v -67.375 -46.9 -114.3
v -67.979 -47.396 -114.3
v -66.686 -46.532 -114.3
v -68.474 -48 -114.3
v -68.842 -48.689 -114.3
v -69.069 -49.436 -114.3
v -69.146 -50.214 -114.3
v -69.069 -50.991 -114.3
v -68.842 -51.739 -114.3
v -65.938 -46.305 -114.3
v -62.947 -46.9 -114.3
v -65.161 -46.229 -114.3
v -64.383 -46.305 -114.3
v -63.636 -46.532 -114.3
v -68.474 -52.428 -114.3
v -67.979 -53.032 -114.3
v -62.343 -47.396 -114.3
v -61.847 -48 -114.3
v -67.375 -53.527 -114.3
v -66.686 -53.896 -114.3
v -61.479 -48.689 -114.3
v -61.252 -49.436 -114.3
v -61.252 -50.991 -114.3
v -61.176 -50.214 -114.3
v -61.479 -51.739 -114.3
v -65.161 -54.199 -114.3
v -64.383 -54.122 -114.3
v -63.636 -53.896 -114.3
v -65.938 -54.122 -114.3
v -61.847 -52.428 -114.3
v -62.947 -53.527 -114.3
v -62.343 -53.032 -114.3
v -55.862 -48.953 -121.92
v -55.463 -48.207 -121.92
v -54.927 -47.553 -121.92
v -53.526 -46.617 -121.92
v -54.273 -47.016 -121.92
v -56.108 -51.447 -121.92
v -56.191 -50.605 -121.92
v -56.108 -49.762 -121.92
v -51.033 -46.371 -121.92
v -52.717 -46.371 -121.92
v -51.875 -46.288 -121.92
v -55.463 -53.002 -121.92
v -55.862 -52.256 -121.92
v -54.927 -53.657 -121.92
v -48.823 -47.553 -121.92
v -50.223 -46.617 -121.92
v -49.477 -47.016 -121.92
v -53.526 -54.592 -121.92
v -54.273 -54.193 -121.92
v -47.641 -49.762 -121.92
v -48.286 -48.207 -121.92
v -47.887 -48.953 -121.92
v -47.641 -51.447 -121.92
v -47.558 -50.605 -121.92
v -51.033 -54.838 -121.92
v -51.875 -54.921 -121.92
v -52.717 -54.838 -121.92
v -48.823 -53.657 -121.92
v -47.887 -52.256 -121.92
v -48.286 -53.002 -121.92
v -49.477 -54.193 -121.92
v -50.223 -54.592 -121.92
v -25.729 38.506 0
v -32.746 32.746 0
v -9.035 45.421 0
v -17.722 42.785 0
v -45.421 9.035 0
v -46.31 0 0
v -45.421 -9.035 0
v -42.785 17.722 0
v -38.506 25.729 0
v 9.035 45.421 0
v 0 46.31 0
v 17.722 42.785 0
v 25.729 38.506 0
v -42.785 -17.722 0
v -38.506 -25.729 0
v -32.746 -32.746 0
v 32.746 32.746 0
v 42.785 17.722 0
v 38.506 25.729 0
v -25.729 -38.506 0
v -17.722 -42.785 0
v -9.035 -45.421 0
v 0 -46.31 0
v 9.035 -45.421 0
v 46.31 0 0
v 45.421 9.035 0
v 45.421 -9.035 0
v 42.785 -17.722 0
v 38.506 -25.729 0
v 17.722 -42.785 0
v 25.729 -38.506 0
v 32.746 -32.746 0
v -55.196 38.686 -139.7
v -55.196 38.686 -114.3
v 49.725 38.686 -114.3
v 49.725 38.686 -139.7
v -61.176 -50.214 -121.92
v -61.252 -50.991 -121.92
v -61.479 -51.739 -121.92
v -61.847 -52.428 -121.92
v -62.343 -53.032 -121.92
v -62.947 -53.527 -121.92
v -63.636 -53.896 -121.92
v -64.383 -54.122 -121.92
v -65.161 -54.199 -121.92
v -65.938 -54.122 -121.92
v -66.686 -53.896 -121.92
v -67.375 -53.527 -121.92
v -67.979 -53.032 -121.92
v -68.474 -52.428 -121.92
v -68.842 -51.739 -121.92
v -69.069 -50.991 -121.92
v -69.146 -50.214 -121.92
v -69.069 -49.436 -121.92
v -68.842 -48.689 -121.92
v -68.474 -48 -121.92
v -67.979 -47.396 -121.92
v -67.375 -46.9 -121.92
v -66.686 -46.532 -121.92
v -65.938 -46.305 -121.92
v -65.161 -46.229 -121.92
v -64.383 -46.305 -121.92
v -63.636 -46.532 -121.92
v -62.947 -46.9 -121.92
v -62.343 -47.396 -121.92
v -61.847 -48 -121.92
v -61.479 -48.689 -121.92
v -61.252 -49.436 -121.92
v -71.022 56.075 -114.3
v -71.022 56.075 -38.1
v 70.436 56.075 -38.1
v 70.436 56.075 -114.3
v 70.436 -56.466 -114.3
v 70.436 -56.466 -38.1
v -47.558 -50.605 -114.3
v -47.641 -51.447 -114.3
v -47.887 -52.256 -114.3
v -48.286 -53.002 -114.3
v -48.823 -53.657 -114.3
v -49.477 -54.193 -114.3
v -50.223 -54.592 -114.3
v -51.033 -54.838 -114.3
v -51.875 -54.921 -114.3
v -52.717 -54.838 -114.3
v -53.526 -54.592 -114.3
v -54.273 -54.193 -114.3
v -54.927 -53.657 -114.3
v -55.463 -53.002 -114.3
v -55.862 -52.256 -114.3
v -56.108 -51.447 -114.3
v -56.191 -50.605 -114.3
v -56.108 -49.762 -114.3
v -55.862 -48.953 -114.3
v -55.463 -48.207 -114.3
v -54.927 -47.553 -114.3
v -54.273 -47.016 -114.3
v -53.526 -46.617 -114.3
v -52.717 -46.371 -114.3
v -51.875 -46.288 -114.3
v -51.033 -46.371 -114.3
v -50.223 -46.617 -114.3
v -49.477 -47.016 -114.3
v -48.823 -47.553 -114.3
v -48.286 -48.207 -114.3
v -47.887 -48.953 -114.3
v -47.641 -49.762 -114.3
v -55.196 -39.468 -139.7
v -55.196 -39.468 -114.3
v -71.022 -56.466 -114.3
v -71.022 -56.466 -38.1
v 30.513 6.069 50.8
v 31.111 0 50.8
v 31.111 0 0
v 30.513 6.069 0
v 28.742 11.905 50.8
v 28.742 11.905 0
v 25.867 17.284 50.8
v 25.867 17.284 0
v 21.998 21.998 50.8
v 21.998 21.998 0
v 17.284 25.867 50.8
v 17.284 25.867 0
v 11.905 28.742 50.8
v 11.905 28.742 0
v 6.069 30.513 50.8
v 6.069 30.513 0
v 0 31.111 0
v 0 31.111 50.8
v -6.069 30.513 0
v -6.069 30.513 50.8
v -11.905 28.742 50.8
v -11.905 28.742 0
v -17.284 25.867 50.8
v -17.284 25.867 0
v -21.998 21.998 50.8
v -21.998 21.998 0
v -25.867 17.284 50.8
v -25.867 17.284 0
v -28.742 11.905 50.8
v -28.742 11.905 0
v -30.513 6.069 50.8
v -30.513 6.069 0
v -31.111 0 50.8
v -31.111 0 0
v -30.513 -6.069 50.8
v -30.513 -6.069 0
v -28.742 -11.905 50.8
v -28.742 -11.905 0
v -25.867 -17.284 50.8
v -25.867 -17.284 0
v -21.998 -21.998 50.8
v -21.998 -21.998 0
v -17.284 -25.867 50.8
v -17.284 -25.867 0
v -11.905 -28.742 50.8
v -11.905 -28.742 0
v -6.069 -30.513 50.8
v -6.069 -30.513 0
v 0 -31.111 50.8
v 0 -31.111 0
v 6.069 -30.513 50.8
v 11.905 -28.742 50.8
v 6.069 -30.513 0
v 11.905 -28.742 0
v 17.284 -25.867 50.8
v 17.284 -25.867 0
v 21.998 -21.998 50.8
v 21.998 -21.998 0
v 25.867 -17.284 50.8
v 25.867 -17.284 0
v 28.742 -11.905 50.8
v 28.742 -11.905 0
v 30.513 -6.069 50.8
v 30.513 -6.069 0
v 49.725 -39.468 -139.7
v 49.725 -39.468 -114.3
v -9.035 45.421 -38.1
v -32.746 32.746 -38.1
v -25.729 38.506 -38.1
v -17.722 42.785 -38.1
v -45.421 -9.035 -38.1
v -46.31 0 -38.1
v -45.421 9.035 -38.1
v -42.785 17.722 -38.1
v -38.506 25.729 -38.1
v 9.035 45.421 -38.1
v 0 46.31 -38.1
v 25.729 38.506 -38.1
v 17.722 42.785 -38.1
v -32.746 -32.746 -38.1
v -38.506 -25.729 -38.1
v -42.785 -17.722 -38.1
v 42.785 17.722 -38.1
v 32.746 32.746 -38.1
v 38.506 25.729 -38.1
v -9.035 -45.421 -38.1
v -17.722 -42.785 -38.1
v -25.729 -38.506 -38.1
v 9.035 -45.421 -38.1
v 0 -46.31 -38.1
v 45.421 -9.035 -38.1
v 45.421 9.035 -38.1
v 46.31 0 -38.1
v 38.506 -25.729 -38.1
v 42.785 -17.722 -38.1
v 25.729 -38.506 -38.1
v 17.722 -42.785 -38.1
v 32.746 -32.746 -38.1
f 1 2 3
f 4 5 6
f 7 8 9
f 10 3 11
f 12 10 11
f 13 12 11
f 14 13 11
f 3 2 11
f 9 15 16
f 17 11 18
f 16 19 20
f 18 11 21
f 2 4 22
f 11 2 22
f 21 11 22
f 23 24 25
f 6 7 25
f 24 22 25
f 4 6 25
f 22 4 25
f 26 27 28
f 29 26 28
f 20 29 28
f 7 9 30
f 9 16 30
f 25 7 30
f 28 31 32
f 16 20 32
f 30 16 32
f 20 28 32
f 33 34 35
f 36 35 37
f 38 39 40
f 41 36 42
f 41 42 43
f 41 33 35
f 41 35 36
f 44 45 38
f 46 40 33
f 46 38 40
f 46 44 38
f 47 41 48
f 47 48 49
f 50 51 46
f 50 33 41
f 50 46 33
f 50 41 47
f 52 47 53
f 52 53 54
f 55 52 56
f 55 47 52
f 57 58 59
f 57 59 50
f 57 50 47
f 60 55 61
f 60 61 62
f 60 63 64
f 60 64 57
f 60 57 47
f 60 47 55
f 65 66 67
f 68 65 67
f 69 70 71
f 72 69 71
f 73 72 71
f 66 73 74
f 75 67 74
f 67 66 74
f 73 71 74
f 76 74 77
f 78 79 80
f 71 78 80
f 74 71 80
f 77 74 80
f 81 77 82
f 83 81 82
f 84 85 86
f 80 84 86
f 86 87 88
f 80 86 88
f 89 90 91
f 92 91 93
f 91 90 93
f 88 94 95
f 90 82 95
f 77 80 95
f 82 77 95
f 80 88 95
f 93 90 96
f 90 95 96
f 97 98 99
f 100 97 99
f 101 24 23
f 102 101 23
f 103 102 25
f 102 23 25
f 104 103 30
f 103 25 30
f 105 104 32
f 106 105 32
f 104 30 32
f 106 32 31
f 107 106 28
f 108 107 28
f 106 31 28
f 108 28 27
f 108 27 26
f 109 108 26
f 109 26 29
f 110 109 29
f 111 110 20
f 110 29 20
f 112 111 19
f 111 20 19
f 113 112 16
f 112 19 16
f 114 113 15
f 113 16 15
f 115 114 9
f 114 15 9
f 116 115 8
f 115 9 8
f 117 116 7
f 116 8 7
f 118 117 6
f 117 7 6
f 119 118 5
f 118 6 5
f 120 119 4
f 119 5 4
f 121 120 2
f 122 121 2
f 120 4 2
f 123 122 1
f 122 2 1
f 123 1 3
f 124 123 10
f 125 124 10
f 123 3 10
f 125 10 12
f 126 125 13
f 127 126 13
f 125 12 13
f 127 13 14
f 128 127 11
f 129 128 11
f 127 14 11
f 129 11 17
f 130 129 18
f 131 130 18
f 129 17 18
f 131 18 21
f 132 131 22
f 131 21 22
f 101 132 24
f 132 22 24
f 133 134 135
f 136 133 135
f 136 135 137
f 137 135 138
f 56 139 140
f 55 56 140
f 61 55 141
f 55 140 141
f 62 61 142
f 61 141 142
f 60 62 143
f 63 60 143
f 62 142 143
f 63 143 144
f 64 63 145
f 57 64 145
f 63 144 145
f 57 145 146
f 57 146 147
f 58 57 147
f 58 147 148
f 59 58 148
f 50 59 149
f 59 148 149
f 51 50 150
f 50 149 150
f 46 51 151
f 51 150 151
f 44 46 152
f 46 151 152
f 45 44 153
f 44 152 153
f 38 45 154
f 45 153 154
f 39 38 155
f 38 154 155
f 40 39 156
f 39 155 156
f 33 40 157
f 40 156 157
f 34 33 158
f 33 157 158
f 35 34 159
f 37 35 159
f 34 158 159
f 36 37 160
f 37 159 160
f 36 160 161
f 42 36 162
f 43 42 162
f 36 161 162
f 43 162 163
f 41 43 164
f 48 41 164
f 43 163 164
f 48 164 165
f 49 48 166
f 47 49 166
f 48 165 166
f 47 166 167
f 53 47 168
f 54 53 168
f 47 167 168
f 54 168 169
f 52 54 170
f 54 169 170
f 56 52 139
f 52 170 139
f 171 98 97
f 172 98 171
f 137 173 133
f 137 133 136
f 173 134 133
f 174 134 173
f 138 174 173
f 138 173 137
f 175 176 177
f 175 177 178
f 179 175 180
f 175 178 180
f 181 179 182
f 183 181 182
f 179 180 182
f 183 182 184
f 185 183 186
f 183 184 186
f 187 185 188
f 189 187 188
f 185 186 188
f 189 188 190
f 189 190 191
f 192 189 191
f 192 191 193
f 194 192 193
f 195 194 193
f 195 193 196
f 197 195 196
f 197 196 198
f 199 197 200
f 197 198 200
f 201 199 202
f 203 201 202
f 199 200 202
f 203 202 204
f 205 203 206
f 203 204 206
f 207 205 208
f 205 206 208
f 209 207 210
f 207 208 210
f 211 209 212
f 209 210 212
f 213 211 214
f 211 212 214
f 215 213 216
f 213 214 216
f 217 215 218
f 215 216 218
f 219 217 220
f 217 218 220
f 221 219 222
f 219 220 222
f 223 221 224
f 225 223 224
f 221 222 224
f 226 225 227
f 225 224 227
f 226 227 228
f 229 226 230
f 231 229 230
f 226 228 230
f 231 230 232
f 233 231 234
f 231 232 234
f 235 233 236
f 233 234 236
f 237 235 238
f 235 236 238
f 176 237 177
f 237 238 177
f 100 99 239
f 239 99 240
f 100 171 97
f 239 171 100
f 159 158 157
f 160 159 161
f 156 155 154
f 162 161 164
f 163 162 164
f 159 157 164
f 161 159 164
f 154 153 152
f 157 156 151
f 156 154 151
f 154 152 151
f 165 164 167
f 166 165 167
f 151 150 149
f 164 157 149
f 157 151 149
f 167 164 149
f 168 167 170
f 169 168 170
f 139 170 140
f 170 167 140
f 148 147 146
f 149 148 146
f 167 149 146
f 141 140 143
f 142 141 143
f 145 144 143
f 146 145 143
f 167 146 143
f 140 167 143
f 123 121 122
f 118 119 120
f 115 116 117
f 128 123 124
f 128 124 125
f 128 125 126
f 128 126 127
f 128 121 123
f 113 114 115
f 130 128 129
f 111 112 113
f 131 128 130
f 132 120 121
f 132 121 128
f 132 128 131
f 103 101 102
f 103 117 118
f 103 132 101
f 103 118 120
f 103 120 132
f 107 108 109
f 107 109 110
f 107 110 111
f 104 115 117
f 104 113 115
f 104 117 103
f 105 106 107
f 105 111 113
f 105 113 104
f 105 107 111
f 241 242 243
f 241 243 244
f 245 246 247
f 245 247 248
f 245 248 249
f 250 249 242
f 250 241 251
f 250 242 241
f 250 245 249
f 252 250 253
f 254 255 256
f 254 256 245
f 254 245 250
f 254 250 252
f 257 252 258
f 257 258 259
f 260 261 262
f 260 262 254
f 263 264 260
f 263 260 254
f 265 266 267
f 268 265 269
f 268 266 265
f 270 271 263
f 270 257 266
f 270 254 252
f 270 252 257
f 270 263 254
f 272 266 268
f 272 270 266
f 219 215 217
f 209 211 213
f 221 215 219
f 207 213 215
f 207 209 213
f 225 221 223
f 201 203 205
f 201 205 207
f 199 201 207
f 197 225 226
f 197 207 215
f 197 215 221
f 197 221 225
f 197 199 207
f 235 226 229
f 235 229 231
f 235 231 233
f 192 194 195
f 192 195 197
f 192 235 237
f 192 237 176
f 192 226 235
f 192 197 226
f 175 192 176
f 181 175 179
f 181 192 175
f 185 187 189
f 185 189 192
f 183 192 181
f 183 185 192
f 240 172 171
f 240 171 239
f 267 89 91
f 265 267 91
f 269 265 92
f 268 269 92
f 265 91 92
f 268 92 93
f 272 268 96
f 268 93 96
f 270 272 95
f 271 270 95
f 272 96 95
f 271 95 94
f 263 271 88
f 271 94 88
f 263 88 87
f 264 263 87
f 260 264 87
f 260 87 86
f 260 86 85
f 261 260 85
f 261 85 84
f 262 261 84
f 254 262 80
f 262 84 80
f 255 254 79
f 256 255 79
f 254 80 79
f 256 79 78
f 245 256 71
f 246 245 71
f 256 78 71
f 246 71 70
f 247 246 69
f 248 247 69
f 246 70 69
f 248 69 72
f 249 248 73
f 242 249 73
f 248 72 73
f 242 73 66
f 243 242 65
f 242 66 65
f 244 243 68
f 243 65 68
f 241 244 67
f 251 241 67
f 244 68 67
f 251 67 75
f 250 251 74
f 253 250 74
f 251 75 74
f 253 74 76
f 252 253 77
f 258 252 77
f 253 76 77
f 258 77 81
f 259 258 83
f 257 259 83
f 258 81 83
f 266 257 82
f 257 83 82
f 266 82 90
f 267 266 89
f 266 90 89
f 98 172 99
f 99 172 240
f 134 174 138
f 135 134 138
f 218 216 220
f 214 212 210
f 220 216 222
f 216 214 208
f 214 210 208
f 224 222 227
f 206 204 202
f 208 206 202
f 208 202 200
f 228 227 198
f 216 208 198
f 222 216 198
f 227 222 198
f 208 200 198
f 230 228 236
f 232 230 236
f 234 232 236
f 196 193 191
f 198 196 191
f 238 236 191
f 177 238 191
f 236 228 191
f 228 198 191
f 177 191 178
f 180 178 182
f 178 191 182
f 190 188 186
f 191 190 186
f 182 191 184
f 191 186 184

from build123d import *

# Parameters (mm, degrees)
F0_R      = 31.110515
F1_DEPTH  = 50.8
F2_R      = 46.31038
F3_DEPTH  = 38.1
F4_W      = 141.458466
F4_H      = 112.541542
F5_DEPTH  = 76.2
F6_R      = 3.985075
F7_DEPTH  = 7.62
F8_R      = 4.316187
F9_DEPTH  = 7.62
F10_W     = 104.921539
F10_H     = 78.153845
F11_DEPTH = 25.4


with BuildPart() as f1:
    # F0 (on Top) → F1 (new body)
    with BuildSketch(Plane.XY):
        Circle(F0_R)
    extrude(amount=F1_DEPTH)


with BuildPart() as f3:
    # F2 (on face) → F3 (new body)
    with BuildSketch(Plane(origin=(0, 0, 0), x_dir=(1, 0, 0), z_dir=(0, 0, -1))):
        Circle(F2_R)
    extrude(amount=F3_DEPTH)


with BuildPart() as f5:
    # F4 (on face) → F5 (new body)
    with BuildSketch(Plane(origin=(0, 0, -38.1), x_dir=(1, 0, 0), z_dir=(0, 0, -1))):
        with Locations((-0.293076, 0.195384)):
            Rectangle(F4_W, F4_H)
    extrude(amount=F5_DEPTH)


with BuildPart() as f7:
    # F6 (on face) → F7 (new body)
    with BuildSketch(Plane(origin=(0, 0, -114.3), x_dir=(1, 0, 0), z_dir=(0, 0, -1))):
        with Locations((-65.160766, 50.213847)):
            Circle(F6_R)
    extrude(amount=F7_DEPTH)


with BuildPart() as f9:
    # F8 (on face) → F9 (new body)
    with BuildSketch(Plane(origin=(0, 0, -114.3), x_dir=(1, 0, 0), z_dir=(0, 0, -1))):
        with Locations((-51.874619, 50.604537)):
            Circle(F8_R)
    extrude(amount=F9_DEPTH)


with BuildPart() as f11:
    # F10 (on face) → F11 (new body)
    with BuildSketch(Plane(origin=(0, 0, -114.3), x_dir=(1, 0, 0), z_dir=(0, 0, -1))):
        with Locations((-2.735385, 0.39077)):
            Rectangle(F10_W, F10_H)
    extrude(amount=F11_DEPTH)


solid = Compound([f1.part, f3.part, f5.part, f7.part, f9.part, f11.part])
